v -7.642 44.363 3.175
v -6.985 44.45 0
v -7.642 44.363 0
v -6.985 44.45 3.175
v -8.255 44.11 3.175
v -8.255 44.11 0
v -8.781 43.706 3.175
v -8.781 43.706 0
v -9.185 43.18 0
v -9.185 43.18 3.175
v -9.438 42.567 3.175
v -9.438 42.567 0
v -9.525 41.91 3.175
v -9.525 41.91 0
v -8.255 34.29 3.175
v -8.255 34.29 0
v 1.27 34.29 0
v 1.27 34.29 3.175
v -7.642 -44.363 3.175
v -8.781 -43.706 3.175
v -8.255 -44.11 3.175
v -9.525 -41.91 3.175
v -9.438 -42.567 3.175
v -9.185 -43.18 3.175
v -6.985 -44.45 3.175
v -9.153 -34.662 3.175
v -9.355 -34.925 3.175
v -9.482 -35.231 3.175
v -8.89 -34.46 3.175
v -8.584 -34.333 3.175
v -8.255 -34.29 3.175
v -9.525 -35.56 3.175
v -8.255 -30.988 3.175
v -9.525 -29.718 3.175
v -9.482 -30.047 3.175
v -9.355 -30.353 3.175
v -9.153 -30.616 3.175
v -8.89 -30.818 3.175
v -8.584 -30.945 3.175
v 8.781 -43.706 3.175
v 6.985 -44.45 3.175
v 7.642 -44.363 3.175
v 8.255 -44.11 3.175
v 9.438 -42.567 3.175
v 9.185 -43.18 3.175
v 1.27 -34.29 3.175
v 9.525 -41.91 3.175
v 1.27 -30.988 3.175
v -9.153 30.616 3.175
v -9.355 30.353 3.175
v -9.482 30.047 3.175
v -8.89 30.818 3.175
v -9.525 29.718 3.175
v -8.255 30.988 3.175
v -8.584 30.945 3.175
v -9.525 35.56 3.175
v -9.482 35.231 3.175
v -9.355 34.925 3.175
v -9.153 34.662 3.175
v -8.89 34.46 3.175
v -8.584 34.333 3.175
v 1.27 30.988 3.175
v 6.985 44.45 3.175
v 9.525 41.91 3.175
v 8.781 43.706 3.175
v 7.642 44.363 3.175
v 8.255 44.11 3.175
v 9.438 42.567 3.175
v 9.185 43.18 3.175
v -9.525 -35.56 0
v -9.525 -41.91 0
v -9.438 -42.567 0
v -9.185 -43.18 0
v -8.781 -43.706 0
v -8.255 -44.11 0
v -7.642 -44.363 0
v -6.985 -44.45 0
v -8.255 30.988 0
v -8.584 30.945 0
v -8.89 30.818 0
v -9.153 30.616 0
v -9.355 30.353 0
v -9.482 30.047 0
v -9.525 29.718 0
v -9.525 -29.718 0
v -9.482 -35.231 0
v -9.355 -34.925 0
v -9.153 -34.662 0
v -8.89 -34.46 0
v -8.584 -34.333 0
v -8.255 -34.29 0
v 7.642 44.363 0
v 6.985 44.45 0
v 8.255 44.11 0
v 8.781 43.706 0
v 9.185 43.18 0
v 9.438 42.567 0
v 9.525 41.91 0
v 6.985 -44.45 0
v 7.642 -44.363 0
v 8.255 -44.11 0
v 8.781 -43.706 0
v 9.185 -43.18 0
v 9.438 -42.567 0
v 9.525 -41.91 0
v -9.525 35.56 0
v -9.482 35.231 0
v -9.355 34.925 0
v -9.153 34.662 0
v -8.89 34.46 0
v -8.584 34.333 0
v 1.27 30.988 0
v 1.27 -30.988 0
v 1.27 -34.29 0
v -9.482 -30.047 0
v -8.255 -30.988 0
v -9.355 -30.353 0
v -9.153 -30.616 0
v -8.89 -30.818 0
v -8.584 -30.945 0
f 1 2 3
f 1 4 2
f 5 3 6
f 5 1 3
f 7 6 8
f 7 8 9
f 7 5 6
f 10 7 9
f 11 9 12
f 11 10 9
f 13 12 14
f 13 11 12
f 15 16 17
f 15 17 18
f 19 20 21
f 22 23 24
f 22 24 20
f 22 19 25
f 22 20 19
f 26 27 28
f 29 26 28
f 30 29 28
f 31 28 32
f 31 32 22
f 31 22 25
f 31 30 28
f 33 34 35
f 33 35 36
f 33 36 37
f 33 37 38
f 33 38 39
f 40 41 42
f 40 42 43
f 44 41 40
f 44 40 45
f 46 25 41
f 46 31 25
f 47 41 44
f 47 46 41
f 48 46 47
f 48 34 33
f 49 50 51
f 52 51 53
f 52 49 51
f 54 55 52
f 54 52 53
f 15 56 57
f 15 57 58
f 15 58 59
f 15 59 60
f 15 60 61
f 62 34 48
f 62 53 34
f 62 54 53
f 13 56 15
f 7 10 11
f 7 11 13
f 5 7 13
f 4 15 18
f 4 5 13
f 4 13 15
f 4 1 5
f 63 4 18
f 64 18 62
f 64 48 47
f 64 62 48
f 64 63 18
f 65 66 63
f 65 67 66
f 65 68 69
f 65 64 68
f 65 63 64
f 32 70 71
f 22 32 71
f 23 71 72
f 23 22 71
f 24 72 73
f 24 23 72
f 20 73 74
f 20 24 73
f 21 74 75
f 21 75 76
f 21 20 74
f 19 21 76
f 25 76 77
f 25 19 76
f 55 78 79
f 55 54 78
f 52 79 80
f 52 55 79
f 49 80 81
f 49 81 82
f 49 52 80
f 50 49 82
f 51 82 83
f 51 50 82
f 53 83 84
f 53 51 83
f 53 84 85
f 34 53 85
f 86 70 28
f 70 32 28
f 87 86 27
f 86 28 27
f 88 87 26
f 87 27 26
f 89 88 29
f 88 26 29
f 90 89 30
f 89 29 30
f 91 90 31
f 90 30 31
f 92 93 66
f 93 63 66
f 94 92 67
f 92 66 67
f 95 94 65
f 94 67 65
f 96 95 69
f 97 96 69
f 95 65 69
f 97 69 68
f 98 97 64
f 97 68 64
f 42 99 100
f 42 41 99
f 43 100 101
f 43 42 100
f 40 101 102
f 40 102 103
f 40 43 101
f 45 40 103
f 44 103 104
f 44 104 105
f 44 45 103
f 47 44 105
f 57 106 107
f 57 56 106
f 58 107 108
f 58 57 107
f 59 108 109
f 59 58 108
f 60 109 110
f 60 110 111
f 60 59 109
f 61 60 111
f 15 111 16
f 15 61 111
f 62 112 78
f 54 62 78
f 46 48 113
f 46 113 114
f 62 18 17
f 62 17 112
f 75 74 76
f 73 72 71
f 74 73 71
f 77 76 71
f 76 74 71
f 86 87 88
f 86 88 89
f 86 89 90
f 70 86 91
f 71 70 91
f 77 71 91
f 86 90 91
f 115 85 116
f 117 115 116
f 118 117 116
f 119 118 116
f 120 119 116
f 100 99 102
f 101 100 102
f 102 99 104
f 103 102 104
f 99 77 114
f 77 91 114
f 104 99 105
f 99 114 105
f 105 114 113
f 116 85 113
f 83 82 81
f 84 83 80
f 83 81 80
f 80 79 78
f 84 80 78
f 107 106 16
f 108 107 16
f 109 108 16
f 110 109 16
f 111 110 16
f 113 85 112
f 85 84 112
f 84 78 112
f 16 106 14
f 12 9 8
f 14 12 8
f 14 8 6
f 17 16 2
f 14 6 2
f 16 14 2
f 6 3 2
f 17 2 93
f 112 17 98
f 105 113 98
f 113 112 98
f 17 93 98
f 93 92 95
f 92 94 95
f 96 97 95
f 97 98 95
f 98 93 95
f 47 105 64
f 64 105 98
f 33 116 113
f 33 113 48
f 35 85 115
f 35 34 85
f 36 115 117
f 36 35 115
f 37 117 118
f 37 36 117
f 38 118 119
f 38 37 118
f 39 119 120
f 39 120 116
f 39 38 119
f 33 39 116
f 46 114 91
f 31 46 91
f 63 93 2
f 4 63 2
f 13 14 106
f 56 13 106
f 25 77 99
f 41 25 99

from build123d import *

# Parameters (mm, degrees)
F1_DEPTH  = 3.175
F2_R      = 2.54
F3_R      = 1.27
F1_FACE_W = 3.302
F1_FACE_H = 3.175
F4_DEPTH  = 1.143


with BuildPart() as f1:
    # F0 (on Top) → F1 (new body)
    with BuildSketch(Plane.XY):
        Polygon((9.525, 44.45), (-9.525, 44.45), (-9.525, 34.29), (0.127, 34.29), (0.127, 30.988), (-9.525, 30.988), (-9.525, -30.988), (0.127, -30.988), (0.127, -34.29), (-9.525, -34.29), (-9.525, -44.45), (9.525, -44.45), align=None)
    extrude(amount=F1_DEPTH)

    # F2
    f2_edges = [f1.edges().sort_by_distance(p)[0] for p in [
        (-9.525, 44.45, 1.5875),
        (9.525, 44.45, 1.5875),
        (9.525, -44.45, 1.5875),
        (-9.525, -44.45, 1.5875),
    ]]
    fillet(f2_edges, radius=F2_R)

    # F3
    f3_edges = [f1.edges().sort_by_distance(p)[0] for p in [
        (-9.525, 34.29, 1.5875),
        (-9.525, -30.988, 1.5875),
        (-9.525, 30.988, 1.5875),
        (-9.525, -34.29, 1.5875),
    ]]
    fillet(f3_edges, radius=F3_R)

    # F1_face (on face) → F4 (cut)
    with BuildSketch(Plane(origin=(0.127, 32.639, 1.5875), x_dir=(0, -1, 0), z_dir=(-1, 0, 0))):
        Rectangle(F1_FACE_W, F1_FACE_H)
        with Locations((65.278, 0)):
            Rectangle(F1_FACE_W, F1_FACE_H)
    extrude(amount=-F4_DEPTH, mode=Mode.SUBTRACT)


solid = f1.part
